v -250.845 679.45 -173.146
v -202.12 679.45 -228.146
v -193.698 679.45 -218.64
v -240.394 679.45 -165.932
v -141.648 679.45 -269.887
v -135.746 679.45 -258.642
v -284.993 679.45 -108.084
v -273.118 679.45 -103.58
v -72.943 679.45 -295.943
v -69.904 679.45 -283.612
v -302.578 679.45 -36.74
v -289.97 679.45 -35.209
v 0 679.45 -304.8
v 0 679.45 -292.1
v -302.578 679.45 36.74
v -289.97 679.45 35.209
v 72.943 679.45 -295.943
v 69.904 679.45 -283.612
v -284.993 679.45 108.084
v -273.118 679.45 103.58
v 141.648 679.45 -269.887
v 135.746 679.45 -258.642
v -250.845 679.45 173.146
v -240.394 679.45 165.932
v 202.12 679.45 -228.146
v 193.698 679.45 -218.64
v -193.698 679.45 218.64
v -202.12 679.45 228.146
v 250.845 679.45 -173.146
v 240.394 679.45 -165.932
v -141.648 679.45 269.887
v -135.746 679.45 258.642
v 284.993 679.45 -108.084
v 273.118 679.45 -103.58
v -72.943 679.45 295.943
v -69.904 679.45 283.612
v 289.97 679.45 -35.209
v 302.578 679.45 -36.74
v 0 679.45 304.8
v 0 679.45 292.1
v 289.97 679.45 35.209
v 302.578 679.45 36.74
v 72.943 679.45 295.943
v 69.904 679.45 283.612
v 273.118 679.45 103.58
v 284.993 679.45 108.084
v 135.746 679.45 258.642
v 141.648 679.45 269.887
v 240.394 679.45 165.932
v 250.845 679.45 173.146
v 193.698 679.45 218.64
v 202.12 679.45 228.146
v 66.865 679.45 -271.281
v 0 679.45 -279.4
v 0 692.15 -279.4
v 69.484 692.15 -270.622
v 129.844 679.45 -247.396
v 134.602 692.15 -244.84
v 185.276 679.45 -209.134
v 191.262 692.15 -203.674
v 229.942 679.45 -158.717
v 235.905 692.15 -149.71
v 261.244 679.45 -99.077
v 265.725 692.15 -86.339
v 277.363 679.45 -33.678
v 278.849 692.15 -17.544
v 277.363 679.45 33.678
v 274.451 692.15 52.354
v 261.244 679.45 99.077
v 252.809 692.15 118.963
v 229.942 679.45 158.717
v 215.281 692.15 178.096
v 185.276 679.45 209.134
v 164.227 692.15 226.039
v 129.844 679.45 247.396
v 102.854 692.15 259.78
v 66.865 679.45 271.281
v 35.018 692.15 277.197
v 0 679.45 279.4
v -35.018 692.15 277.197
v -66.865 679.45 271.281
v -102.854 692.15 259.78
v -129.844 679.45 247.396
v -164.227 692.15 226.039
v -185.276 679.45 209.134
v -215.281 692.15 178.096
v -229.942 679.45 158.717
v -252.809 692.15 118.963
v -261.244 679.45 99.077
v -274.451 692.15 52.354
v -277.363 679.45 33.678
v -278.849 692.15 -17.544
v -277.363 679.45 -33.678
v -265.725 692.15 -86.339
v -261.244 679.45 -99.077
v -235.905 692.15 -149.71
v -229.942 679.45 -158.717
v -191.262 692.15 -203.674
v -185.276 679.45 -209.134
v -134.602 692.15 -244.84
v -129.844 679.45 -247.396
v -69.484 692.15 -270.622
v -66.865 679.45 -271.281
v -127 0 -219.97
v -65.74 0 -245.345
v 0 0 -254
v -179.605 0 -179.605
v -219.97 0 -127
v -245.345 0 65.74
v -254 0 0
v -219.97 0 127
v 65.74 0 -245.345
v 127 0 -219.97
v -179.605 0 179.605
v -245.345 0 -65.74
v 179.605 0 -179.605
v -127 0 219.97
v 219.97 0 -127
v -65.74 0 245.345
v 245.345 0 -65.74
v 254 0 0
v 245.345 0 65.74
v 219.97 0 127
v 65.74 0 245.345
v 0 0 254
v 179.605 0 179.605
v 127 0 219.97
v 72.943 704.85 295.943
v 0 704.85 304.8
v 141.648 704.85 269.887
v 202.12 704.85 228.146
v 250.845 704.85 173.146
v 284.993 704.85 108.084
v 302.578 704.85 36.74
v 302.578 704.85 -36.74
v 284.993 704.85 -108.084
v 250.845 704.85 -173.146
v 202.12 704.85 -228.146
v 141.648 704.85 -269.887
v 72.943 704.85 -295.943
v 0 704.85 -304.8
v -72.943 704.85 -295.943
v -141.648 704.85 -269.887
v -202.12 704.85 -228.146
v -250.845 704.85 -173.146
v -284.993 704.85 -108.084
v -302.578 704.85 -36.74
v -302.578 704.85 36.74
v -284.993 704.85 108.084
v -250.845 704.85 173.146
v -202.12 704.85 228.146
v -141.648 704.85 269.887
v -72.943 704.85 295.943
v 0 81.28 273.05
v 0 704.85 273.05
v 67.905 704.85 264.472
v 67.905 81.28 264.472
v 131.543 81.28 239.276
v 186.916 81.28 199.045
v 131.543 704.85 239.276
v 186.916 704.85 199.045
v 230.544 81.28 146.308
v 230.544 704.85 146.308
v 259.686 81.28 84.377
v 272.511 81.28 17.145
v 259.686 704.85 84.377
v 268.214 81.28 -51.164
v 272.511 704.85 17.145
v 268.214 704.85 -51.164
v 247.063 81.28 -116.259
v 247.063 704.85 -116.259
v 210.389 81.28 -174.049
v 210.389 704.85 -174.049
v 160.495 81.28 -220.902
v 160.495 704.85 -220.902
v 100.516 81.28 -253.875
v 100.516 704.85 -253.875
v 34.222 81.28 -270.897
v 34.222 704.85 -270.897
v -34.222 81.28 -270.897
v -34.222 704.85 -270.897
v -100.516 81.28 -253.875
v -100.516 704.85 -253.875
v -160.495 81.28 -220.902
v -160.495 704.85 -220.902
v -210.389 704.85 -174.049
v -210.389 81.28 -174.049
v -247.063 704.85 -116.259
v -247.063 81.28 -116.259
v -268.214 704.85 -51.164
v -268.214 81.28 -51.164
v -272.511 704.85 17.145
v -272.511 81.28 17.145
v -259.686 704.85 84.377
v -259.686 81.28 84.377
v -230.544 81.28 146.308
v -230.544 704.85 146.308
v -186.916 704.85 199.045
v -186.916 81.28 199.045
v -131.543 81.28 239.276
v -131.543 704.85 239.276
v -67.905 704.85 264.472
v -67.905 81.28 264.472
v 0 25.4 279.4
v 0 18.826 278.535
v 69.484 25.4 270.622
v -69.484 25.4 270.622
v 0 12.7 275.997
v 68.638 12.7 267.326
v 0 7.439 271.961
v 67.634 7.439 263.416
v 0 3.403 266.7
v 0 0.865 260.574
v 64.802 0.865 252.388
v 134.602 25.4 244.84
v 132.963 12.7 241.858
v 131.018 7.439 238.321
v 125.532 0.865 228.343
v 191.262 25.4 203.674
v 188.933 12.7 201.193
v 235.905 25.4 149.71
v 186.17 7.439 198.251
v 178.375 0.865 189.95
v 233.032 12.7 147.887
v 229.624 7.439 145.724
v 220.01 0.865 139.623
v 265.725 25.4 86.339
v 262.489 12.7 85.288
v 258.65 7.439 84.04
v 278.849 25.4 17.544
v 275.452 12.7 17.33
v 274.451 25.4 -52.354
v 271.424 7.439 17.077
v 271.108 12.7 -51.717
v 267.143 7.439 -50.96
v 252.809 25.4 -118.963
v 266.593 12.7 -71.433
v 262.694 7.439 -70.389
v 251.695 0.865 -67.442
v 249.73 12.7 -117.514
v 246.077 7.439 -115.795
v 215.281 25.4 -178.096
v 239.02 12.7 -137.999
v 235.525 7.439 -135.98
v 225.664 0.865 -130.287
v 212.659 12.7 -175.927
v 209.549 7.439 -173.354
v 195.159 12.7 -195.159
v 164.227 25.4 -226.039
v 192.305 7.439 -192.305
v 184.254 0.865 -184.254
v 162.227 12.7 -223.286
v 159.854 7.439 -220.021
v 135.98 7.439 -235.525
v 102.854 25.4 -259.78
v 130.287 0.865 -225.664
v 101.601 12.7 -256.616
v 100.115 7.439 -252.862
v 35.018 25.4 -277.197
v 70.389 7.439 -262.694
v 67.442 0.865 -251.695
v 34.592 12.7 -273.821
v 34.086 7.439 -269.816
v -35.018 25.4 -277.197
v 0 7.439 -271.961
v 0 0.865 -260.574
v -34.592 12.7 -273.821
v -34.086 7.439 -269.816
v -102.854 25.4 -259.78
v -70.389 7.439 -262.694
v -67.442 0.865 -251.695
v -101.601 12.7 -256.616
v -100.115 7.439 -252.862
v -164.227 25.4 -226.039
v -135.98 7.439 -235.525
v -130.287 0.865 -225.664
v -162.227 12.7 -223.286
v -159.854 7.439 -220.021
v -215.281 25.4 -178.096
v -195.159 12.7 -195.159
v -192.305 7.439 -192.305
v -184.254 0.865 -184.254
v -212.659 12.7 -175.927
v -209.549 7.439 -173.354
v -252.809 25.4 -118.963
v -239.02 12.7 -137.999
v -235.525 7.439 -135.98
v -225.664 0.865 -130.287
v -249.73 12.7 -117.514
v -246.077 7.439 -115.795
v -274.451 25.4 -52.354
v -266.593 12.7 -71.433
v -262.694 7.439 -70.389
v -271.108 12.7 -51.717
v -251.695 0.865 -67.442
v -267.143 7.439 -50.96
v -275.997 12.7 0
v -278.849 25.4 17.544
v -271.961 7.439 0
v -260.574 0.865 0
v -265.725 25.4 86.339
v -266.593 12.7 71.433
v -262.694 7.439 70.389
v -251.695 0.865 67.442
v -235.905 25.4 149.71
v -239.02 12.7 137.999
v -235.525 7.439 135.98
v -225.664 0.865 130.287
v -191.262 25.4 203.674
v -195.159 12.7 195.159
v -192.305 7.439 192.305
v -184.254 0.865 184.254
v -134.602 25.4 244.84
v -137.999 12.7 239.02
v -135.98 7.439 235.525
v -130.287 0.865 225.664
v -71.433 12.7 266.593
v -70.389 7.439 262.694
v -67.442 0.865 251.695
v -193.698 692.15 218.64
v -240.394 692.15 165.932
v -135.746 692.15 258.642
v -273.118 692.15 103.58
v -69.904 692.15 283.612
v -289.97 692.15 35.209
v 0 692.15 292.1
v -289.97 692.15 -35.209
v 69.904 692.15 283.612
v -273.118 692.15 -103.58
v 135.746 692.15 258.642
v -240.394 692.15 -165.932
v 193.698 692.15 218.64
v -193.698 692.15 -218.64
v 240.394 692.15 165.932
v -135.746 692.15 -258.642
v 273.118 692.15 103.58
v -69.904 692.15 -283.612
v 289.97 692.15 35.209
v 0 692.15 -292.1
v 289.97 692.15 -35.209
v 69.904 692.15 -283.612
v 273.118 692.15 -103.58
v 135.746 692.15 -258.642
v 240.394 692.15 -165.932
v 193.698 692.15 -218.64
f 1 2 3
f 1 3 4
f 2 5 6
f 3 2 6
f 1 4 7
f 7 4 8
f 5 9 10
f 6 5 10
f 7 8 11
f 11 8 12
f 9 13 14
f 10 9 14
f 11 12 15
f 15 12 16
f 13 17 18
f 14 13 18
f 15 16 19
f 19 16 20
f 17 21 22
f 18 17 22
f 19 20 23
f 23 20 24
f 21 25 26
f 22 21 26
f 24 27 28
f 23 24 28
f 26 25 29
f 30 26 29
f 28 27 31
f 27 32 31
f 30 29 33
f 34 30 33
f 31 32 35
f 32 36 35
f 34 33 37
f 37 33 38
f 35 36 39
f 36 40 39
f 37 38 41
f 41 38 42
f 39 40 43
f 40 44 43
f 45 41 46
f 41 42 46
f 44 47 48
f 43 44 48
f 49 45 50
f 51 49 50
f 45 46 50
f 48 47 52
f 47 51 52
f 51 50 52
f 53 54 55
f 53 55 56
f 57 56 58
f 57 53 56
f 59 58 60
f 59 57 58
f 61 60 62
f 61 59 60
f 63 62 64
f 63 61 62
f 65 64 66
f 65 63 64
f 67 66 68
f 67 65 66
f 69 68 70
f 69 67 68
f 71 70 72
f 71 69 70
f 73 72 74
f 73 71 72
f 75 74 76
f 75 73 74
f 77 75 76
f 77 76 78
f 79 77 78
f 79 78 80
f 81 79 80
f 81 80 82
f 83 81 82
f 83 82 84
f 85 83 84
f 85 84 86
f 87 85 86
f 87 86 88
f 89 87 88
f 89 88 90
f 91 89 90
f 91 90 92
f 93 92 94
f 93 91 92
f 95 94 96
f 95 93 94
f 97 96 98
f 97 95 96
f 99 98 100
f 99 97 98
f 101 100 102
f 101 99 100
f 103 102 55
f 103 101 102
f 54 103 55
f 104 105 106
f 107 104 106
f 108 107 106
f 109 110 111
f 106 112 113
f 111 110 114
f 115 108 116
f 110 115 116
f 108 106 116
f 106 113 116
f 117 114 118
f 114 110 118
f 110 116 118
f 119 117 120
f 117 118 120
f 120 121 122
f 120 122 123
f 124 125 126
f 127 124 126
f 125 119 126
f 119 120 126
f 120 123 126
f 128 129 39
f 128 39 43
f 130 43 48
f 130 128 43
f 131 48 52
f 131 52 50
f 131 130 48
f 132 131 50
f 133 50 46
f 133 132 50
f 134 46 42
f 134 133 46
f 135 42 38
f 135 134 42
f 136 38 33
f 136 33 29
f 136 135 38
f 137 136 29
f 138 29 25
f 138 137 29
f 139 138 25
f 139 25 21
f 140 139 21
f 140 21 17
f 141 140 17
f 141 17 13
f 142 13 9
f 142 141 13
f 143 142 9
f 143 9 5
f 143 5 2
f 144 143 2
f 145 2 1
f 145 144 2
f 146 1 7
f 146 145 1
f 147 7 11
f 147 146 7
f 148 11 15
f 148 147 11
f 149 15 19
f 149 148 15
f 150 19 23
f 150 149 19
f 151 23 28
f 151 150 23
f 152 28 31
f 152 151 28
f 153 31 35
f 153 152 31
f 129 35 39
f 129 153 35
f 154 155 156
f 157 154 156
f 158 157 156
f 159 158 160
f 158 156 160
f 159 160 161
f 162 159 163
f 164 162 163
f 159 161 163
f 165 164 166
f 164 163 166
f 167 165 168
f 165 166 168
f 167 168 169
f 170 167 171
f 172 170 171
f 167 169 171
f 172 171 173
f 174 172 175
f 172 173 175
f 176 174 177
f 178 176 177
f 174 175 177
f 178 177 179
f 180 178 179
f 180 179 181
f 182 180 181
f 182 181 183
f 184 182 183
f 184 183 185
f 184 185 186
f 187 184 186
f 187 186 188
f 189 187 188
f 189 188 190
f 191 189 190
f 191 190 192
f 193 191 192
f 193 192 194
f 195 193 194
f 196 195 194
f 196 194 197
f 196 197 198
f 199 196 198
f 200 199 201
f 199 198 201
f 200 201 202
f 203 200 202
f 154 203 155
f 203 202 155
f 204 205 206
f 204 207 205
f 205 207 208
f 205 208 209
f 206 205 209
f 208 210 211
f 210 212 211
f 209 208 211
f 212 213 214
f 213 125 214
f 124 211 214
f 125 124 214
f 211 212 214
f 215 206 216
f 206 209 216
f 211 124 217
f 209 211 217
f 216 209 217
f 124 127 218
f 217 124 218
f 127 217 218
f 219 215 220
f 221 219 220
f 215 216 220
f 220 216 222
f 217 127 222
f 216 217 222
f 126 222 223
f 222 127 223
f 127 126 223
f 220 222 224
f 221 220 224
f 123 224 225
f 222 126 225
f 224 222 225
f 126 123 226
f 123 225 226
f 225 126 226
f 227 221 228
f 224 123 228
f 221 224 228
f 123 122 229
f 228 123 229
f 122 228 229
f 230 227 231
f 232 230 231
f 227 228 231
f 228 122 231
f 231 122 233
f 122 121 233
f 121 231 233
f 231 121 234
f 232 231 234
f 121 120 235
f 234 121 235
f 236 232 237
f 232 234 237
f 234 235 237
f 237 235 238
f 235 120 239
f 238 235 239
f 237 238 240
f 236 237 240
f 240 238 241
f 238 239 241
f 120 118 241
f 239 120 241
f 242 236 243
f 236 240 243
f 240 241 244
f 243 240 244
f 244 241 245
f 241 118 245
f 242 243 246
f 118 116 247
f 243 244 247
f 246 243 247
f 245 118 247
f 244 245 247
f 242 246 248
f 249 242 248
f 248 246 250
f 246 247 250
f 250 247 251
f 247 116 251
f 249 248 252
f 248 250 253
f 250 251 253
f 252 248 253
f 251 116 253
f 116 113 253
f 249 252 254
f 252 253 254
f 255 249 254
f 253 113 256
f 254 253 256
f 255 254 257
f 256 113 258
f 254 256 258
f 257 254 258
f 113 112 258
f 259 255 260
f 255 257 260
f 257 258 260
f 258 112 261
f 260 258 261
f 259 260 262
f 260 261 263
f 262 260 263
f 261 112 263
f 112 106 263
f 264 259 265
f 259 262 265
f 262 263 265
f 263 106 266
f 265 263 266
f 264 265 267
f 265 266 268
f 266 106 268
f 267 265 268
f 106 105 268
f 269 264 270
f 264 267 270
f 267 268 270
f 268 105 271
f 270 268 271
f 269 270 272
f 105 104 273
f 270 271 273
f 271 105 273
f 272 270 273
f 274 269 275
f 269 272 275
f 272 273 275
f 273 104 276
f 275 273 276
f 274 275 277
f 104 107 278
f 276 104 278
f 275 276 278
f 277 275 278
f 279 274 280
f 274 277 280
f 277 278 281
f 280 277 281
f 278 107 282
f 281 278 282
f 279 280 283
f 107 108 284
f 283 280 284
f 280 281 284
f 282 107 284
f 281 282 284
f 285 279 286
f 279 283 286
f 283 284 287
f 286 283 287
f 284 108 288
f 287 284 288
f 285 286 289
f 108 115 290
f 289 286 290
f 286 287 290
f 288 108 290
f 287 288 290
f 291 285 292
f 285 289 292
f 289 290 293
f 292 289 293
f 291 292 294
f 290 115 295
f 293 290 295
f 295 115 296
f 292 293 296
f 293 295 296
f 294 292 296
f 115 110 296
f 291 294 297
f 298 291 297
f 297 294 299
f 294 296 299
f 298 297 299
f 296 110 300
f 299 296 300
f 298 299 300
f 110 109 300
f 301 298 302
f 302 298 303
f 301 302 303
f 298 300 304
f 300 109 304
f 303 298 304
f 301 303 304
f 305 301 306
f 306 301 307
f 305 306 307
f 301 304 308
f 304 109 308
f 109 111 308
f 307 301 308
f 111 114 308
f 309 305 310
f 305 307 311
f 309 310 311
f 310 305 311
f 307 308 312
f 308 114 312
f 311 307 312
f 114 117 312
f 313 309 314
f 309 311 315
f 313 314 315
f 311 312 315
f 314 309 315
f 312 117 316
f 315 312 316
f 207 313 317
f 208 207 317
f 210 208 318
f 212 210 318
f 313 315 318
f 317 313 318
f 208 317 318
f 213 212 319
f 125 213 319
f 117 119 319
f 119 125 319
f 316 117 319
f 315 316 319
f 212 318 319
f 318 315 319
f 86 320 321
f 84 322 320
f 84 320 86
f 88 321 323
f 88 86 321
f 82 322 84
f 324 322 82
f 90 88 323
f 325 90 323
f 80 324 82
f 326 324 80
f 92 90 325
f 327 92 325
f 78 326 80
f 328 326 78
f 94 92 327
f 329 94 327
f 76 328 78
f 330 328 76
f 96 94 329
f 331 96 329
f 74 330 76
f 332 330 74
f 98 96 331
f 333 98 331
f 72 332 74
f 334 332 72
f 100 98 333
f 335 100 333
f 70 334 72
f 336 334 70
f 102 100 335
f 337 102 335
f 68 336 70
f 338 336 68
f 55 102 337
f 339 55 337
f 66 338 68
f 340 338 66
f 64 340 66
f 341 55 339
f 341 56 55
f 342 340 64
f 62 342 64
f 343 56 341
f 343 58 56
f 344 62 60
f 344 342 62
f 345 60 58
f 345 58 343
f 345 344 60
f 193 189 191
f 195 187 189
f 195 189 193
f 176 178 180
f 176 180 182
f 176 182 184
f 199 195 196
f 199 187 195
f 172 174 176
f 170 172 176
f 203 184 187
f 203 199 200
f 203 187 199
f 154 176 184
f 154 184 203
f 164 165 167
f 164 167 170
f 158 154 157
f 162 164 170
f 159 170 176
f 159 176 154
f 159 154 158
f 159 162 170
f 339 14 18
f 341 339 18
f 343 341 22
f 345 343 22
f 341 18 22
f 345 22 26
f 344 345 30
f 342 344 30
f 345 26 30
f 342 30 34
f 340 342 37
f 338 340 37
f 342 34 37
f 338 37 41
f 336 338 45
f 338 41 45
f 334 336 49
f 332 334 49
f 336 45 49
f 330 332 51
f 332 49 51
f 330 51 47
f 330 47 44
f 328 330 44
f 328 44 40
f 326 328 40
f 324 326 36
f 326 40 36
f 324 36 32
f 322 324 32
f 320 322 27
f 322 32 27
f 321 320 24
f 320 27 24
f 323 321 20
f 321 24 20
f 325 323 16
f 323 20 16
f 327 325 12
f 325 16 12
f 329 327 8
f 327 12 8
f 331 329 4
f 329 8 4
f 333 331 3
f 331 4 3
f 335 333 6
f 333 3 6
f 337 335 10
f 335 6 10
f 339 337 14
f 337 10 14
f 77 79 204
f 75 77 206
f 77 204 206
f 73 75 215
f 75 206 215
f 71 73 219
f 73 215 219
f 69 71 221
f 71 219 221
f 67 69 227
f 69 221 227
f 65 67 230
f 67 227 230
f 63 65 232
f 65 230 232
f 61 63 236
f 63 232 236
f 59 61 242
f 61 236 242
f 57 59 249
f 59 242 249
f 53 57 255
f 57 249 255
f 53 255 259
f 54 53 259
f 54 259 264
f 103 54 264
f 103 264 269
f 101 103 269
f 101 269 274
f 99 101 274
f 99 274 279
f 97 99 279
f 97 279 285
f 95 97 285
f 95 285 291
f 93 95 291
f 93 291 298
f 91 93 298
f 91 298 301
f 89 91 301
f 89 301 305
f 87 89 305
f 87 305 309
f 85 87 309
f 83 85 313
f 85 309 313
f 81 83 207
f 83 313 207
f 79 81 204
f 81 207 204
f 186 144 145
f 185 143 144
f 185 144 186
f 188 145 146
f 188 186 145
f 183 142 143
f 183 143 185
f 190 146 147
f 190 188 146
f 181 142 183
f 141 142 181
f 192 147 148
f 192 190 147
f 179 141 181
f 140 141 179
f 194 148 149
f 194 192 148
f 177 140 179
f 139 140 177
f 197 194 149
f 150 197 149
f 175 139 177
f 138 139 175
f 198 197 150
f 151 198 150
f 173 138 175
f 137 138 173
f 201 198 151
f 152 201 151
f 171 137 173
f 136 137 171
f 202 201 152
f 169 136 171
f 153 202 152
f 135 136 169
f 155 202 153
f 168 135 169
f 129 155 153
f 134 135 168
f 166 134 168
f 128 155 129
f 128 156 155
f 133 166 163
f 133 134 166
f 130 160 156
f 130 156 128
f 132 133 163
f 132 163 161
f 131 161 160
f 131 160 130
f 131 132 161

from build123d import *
from build123d.topology import SkipClean

# Parameters (mm, degrees)
SKETCH1_R           = 279.4
BOSS_EXTRUDE3_DEPTH = 12.7
SKETCH2_R           = 279.4
BOSS_EXTRUDE6_DEPTH = 692.15
SKETCH8_R           = 273.05
BOSS_EXTRUDE7_DEPTH = 623.57
SKETCH10_R          = 273.05
CUT_EXTRUDE1_DEPTH  = 623.57
FILLET1_R           = 25.4
FILLET2_R           = 2.54
SKETCH11_R          = 304.8
BOSS_EXTRUDE8_DEPTH = 25.4
SKETCH12_R          = 273.05
CUT_EXTRUDE6_DEPTH  = 25.4
SKETCH13_R          = 292.1
SKETCH13_R_2        = 279.4
CUT_EXTRUDE11_DEPTH = 12.7


with BuildPart() as part:
    # Sketch1 → Boss-Extrude3 (new body)
    with BuildSketch(Plane(origin=(0, 0, 0), x_dir=(1, 0, 0), z_dir=(0, 1, 0))):
        with Locations(Location((0, 0, 0), (0, 0, 270))):
            Circle(SKETCH1_R)
    extrude(amount=BOSS_EXTRUDE3_DEPTH)

    # Sketch2 → Boss-Extrude6 (add)
    with BuildSketch(Plane(origin=(0, 12.7, 0), x_dir=(1, 0, 0), z_dir=(0, 1, 0))):
        with Locations(Location((0, 0, 0), (0, 0, 270))):
            Circle(SKETCH2_R)
    extrude(amount=BOSS_EXTRUDE6_DEPTH)

    # Sketch8 → Boss-Extrude7 (add)
    with BuildSketch(Plane(origin=(0, 704.85, 0), x_dir=(1, 0, 0), z_dir=(0, 1, 0))):
        Circle(SKETCH8_R)
    extrude(amount=-BOSS_EXTRUDE7_DEPTH)

    # Sketch10 → Cut-Extrude1 (cut)
    with BuildSketch(Plane(origin=(0, 704.85, 0), x_dir=(1, 0, 0), z_dir=(0, 1, 0))):
        with Locations(Location((0, 0, 0), (0, 0, 270))):
            Circle(SKETCH10_R)
    extrude(amount=-CUT_EXTRUDE1_DEPTH, mode=Mode.SUBTRACT)

    # Fillet1
    fillet1_edges = [part.edges().sort_by_distance(p)[0] for p in [
        (0, 0, -279.4),
    ]]
    fillet(fillet1_edges, radius=FILLET1_R)

    # Fillet2
    fillet2_edges = [part.edges().sort_by_distance(p)[0] for p in [
        (0, 704.85, -273.05),
        (0, 704.85, -279.4),
    ]]
    fillet(fillet2_edges, radius=FILLET2_R)

    # Sketch11 → Boss-Extrude8 (add)
    with BuildSketch(Plane(origin=(0, 704.85, 0), x_dir=(1, 0, 0), z_dir=(0, 1, 0))):
        with Locations(Location((0, 0, 0), (0, 0, 270))):
            Circle(SKETCH11_R)
    extrude(amount=-BOSS_EXTRUDE8_DEPTH)

    # Sketch12 → Cut-Extrude6 (cut)
    with BuildSketch(Plane(origin=(0, 704.85, 0), x_dir=(1, 0, 0), z_dir=(0, 1, 0))):
        with Locations(Location((0, 0, 0), (0, 0, 270))):
            Circle(SKETCH12_R)
    extrude(amount=-CUT_EXTRUDE6_DEPTH, mode=Mode.SUBTRACT)

    # Sketch13 → Cut-Extrude11 (cut)
    with SkipClean():  # the faces are left unmerged after this step: merging them gives an invalid solid
        with BuildSketch(Plane(origin=(0, 679.45, 0), x_dir=(-1, 0, 0), z_dir=(0, -1, 0))):
            with Locations(Location((0, 0, 0), (0, 0, 90))):
                Circle(SKETCH13_R)
            with Locations(Location((0, 0, 0), (0, 0, 90))):
                Circle(SKETCH13_R_2, mode=Mode.SUBTRACT)
        extrude(amount=-CUT_EXTRUDE11_DEPTH, mode=Mode.SUBTRACT)


solid = part.part
